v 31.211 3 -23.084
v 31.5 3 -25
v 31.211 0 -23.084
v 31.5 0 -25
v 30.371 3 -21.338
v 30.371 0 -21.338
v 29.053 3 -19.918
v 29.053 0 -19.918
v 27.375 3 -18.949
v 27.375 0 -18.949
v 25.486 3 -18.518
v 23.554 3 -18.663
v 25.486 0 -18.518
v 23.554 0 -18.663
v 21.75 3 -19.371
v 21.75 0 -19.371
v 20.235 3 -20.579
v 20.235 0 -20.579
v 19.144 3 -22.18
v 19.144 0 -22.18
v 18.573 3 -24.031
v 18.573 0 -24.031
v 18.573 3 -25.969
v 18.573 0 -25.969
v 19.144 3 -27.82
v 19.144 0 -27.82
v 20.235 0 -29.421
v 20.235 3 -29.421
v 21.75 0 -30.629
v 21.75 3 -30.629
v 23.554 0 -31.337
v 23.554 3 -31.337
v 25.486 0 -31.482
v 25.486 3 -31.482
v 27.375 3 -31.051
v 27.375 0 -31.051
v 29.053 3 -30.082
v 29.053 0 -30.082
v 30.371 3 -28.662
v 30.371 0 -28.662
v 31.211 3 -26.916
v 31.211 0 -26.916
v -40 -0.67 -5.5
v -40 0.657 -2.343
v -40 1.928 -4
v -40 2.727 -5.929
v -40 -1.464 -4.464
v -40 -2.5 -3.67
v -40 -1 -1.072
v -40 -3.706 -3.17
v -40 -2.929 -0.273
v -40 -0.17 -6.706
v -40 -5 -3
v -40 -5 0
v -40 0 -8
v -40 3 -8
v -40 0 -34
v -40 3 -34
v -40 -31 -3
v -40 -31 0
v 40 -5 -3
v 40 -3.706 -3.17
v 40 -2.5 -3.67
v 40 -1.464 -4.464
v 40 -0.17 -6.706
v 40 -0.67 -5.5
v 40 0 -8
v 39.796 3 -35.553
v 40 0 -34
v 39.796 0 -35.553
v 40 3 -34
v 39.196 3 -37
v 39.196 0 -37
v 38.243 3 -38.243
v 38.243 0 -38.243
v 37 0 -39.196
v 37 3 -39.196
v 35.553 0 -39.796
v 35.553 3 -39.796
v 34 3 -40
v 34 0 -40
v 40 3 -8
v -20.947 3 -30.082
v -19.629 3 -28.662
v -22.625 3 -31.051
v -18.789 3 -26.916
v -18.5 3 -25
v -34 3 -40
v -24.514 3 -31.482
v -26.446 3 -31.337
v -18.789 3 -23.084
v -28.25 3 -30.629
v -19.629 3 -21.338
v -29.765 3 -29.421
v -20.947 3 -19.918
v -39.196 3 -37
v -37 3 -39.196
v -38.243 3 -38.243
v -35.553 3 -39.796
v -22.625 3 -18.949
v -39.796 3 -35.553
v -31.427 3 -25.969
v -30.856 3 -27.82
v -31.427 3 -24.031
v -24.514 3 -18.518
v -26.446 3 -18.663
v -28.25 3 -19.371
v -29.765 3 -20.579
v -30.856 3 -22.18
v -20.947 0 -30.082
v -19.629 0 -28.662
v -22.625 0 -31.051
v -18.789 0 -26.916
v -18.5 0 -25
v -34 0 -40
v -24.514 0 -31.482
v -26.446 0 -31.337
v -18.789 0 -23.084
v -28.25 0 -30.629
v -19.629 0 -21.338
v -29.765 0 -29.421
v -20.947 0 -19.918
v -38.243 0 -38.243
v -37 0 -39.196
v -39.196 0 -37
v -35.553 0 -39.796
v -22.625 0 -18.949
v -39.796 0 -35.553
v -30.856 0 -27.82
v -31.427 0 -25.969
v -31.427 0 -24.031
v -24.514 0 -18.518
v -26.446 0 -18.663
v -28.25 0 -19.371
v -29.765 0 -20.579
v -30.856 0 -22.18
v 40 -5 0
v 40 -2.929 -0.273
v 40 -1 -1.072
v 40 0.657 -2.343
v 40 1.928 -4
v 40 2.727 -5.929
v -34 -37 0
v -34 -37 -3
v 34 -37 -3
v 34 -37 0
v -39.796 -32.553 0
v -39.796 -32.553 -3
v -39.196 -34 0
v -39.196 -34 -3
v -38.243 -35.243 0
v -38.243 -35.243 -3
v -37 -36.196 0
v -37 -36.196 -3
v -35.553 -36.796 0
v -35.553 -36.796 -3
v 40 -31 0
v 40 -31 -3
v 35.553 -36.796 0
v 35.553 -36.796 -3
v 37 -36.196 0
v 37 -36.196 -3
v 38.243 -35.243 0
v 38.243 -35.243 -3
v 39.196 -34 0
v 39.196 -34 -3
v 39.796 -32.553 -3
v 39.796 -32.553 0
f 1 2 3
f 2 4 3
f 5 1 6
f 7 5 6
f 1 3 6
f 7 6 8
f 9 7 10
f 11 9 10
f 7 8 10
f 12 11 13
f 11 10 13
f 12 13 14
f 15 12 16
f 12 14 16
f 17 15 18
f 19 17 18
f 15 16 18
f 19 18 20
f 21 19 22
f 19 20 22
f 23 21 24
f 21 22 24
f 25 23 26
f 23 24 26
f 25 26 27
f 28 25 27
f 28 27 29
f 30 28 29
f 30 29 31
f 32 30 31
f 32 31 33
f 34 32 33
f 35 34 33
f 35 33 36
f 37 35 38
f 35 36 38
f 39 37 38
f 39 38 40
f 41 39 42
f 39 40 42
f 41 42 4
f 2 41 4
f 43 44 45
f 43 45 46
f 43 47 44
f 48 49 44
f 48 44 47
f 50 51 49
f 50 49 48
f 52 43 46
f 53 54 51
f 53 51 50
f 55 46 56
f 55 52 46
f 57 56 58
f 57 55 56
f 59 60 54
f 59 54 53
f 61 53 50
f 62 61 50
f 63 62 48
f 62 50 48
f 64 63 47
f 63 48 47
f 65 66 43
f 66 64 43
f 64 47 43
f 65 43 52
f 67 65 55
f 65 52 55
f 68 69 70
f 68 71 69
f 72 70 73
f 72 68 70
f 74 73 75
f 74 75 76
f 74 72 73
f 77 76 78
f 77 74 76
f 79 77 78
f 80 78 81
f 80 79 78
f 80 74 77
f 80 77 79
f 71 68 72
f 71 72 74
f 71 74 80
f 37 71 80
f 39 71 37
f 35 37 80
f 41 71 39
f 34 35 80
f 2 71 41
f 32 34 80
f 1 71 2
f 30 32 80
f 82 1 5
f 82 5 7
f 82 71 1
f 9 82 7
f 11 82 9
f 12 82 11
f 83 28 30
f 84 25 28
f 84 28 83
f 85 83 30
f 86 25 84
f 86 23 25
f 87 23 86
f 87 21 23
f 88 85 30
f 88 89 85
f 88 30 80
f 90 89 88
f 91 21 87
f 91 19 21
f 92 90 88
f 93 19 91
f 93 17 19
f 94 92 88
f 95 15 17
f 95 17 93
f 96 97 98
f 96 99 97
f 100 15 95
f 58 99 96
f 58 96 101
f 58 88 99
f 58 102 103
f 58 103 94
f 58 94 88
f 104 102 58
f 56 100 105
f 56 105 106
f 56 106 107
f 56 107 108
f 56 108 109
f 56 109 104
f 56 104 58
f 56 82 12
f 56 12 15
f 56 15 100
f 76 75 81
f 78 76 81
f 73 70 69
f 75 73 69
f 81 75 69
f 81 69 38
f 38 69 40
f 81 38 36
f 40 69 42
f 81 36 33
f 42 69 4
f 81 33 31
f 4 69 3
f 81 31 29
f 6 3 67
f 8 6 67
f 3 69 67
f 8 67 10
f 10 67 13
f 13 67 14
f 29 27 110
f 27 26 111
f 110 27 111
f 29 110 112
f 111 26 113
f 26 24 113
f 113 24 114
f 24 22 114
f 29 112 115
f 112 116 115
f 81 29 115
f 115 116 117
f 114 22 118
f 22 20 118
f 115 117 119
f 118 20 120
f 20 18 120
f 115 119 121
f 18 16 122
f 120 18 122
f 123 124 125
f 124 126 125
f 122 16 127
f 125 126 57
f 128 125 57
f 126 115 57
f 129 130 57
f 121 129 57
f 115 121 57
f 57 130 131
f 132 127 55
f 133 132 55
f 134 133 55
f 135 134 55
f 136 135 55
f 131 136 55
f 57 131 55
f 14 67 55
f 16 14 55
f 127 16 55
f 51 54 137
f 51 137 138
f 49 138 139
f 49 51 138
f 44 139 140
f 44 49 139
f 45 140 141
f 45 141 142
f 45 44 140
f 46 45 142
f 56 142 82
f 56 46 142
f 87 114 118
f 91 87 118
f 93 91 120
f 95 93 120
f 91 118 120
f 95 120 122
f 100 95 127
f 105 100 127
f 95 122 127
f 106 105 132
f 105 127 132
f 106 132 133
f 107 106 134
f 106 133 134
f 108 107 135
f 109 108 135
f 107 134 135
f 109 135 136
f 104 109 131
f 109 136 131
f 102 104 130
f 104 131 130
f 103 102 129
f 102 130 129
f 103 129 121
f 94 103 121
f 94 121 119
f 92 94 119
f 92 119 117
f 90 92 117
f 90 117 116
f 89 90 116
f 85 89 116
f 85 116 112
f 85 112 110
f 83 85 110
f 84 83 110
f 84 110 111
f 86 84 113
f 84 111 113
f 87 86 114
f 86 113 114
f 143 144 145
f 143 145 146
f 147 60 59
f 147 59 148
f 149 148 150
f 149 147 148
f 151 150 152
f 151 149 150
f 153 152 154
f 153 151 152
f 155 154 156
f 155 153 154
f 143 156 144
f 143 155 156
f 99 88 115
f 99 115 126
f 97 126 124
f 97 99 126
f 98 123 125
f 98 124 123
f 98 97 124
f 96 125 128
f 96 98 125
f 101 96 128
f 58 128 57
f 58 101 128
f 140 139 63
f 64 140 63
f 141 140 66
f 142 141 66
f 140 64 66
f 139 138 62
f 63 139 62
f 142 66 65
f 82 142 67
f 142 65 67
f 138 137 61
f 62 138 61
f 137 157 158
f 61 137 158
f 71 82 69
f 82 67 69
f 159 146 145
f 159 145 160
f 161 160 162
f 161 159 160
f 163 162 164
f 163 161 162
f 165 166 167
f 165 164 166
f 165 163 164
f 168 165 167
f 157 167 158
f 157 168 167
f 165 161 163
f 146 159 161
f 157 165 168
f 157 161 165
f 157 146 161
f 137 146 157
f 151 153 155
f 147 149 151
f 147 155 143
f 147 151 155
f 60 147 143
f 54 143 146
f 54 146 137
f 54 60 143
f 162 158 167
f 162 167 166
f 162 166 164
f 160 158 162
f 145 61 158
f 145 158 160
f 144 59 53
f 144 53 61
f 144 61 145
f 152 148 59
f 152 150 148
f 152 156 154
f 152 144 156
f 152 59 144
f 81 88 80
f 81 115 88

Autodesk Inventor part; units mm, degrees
ref_plane "YZ Plane" through (0, 0, 0) normal (1, 0, 0) x (0, 1, 0)
ref_plane "XZ Plane" through (0, 0, 0) normal (0, 1, 0) x (-1, 0, 0)
ref_plane "XY Plane" through (0, 0, 0) normal (0, 0, 1) x (1, 0, 0)
sketch "Sketch4" plane through (0, 0, 0) normal (0, 1, 0) x (-1, 0, 0)
  line L0 (40, -40) -> (-40, -40)
  line L1 (-40, -40) -> (-40, 0)
  line L2 (-40, 0) -> (40, 0)
  line L3 (40, 0) -> (40, -40)
  point P0 (0, 0)
  point P1 (0, 0)
  dimension "d36" = 80
  dimension "d37" = 40
extrude "Plate2" add sketch "Sketch4" along normal blind 3
sketch "Sketch5" plane through (0, 0, 0) normal (0, -1, 0) x (1, 0, 0)
  circle A0 centre (-25, -25) radius 6.5
  circle A1 centre (25, -25) radius 6.5
  line L0 (0, 0) -> (0, -40) construction
  line L1 (40, -40) -> (-40, -40) construction
  dimension "d39" = 50
  dimension "d40" = 15
  dimension "d41" = 13
extrude "Cut1" cut sketch "Sketch5" against normal blind 3
sketch "Sketch6" plane through (-40, 3, -3) normal (0, 0, 1) x (1, 0, 0)
  line L0 (80, 0) -> (0, 0)
  line L1 (0, 0) -> (0, -40)
  line L2 (0, -40) -> (80, -40)
  line L3 (80, -40) -> (80, 0)
edge flange "Flange1" height 40 angle 90 thickness 3 bend radius 5 thickness toward (0, 0, 1) relief round relief width 3 relief depth 1.5 edges at (0, 0, 0) wall of the first edge with corners at (40, 3, -3) (-40, 3, -3) (-40, -37, -3) (40, -37, -3)
bend "Bend1"
corner "Corner1"
fillet "Corner Round6" radius 6 4 edges at (40, -37, -1.5) (-40, 1.5, -40) (40, 1.5, -40) (-40, -37, -1.5)
equation "\"d42\" = Thickness"
equation "\"d38\" = Thickness"
equation "\"d44\" = BendReliefWidth"
equation "\"d45\" = BendReliefDepth"
equation "\"d46\" = MinimumRemnant"
equation "\"d47\" = TransitionRadius"
equation "\"d50\" = BendRadius"
equation "\"d51\" = CornerReliefSize"
equation "\"d52\" = GapSize"
equation "\"d53\" = JacobiRadiusSize"
equation "\"BendReliefWidth\" = Thickness"
equation "\"BendReliefDepth\" = 0.5 * Thickness"
equation "\"CornerReliefSize\" = 4 * Thickness"
equation "\"MinimumRemnant\" = 2 * Thickness"
equation "\"TransitionRadius\" = BendRadius"
equation "\"JacobiRadiusSize\" = BendRadius"
equation "\"GapSize\" = Thickness"
equation "\"Thickness\" = 3"
equation "\"BendRadius\" = 5"
properties part number "MSC 912 flange slipway" material "Stainless Steel"
